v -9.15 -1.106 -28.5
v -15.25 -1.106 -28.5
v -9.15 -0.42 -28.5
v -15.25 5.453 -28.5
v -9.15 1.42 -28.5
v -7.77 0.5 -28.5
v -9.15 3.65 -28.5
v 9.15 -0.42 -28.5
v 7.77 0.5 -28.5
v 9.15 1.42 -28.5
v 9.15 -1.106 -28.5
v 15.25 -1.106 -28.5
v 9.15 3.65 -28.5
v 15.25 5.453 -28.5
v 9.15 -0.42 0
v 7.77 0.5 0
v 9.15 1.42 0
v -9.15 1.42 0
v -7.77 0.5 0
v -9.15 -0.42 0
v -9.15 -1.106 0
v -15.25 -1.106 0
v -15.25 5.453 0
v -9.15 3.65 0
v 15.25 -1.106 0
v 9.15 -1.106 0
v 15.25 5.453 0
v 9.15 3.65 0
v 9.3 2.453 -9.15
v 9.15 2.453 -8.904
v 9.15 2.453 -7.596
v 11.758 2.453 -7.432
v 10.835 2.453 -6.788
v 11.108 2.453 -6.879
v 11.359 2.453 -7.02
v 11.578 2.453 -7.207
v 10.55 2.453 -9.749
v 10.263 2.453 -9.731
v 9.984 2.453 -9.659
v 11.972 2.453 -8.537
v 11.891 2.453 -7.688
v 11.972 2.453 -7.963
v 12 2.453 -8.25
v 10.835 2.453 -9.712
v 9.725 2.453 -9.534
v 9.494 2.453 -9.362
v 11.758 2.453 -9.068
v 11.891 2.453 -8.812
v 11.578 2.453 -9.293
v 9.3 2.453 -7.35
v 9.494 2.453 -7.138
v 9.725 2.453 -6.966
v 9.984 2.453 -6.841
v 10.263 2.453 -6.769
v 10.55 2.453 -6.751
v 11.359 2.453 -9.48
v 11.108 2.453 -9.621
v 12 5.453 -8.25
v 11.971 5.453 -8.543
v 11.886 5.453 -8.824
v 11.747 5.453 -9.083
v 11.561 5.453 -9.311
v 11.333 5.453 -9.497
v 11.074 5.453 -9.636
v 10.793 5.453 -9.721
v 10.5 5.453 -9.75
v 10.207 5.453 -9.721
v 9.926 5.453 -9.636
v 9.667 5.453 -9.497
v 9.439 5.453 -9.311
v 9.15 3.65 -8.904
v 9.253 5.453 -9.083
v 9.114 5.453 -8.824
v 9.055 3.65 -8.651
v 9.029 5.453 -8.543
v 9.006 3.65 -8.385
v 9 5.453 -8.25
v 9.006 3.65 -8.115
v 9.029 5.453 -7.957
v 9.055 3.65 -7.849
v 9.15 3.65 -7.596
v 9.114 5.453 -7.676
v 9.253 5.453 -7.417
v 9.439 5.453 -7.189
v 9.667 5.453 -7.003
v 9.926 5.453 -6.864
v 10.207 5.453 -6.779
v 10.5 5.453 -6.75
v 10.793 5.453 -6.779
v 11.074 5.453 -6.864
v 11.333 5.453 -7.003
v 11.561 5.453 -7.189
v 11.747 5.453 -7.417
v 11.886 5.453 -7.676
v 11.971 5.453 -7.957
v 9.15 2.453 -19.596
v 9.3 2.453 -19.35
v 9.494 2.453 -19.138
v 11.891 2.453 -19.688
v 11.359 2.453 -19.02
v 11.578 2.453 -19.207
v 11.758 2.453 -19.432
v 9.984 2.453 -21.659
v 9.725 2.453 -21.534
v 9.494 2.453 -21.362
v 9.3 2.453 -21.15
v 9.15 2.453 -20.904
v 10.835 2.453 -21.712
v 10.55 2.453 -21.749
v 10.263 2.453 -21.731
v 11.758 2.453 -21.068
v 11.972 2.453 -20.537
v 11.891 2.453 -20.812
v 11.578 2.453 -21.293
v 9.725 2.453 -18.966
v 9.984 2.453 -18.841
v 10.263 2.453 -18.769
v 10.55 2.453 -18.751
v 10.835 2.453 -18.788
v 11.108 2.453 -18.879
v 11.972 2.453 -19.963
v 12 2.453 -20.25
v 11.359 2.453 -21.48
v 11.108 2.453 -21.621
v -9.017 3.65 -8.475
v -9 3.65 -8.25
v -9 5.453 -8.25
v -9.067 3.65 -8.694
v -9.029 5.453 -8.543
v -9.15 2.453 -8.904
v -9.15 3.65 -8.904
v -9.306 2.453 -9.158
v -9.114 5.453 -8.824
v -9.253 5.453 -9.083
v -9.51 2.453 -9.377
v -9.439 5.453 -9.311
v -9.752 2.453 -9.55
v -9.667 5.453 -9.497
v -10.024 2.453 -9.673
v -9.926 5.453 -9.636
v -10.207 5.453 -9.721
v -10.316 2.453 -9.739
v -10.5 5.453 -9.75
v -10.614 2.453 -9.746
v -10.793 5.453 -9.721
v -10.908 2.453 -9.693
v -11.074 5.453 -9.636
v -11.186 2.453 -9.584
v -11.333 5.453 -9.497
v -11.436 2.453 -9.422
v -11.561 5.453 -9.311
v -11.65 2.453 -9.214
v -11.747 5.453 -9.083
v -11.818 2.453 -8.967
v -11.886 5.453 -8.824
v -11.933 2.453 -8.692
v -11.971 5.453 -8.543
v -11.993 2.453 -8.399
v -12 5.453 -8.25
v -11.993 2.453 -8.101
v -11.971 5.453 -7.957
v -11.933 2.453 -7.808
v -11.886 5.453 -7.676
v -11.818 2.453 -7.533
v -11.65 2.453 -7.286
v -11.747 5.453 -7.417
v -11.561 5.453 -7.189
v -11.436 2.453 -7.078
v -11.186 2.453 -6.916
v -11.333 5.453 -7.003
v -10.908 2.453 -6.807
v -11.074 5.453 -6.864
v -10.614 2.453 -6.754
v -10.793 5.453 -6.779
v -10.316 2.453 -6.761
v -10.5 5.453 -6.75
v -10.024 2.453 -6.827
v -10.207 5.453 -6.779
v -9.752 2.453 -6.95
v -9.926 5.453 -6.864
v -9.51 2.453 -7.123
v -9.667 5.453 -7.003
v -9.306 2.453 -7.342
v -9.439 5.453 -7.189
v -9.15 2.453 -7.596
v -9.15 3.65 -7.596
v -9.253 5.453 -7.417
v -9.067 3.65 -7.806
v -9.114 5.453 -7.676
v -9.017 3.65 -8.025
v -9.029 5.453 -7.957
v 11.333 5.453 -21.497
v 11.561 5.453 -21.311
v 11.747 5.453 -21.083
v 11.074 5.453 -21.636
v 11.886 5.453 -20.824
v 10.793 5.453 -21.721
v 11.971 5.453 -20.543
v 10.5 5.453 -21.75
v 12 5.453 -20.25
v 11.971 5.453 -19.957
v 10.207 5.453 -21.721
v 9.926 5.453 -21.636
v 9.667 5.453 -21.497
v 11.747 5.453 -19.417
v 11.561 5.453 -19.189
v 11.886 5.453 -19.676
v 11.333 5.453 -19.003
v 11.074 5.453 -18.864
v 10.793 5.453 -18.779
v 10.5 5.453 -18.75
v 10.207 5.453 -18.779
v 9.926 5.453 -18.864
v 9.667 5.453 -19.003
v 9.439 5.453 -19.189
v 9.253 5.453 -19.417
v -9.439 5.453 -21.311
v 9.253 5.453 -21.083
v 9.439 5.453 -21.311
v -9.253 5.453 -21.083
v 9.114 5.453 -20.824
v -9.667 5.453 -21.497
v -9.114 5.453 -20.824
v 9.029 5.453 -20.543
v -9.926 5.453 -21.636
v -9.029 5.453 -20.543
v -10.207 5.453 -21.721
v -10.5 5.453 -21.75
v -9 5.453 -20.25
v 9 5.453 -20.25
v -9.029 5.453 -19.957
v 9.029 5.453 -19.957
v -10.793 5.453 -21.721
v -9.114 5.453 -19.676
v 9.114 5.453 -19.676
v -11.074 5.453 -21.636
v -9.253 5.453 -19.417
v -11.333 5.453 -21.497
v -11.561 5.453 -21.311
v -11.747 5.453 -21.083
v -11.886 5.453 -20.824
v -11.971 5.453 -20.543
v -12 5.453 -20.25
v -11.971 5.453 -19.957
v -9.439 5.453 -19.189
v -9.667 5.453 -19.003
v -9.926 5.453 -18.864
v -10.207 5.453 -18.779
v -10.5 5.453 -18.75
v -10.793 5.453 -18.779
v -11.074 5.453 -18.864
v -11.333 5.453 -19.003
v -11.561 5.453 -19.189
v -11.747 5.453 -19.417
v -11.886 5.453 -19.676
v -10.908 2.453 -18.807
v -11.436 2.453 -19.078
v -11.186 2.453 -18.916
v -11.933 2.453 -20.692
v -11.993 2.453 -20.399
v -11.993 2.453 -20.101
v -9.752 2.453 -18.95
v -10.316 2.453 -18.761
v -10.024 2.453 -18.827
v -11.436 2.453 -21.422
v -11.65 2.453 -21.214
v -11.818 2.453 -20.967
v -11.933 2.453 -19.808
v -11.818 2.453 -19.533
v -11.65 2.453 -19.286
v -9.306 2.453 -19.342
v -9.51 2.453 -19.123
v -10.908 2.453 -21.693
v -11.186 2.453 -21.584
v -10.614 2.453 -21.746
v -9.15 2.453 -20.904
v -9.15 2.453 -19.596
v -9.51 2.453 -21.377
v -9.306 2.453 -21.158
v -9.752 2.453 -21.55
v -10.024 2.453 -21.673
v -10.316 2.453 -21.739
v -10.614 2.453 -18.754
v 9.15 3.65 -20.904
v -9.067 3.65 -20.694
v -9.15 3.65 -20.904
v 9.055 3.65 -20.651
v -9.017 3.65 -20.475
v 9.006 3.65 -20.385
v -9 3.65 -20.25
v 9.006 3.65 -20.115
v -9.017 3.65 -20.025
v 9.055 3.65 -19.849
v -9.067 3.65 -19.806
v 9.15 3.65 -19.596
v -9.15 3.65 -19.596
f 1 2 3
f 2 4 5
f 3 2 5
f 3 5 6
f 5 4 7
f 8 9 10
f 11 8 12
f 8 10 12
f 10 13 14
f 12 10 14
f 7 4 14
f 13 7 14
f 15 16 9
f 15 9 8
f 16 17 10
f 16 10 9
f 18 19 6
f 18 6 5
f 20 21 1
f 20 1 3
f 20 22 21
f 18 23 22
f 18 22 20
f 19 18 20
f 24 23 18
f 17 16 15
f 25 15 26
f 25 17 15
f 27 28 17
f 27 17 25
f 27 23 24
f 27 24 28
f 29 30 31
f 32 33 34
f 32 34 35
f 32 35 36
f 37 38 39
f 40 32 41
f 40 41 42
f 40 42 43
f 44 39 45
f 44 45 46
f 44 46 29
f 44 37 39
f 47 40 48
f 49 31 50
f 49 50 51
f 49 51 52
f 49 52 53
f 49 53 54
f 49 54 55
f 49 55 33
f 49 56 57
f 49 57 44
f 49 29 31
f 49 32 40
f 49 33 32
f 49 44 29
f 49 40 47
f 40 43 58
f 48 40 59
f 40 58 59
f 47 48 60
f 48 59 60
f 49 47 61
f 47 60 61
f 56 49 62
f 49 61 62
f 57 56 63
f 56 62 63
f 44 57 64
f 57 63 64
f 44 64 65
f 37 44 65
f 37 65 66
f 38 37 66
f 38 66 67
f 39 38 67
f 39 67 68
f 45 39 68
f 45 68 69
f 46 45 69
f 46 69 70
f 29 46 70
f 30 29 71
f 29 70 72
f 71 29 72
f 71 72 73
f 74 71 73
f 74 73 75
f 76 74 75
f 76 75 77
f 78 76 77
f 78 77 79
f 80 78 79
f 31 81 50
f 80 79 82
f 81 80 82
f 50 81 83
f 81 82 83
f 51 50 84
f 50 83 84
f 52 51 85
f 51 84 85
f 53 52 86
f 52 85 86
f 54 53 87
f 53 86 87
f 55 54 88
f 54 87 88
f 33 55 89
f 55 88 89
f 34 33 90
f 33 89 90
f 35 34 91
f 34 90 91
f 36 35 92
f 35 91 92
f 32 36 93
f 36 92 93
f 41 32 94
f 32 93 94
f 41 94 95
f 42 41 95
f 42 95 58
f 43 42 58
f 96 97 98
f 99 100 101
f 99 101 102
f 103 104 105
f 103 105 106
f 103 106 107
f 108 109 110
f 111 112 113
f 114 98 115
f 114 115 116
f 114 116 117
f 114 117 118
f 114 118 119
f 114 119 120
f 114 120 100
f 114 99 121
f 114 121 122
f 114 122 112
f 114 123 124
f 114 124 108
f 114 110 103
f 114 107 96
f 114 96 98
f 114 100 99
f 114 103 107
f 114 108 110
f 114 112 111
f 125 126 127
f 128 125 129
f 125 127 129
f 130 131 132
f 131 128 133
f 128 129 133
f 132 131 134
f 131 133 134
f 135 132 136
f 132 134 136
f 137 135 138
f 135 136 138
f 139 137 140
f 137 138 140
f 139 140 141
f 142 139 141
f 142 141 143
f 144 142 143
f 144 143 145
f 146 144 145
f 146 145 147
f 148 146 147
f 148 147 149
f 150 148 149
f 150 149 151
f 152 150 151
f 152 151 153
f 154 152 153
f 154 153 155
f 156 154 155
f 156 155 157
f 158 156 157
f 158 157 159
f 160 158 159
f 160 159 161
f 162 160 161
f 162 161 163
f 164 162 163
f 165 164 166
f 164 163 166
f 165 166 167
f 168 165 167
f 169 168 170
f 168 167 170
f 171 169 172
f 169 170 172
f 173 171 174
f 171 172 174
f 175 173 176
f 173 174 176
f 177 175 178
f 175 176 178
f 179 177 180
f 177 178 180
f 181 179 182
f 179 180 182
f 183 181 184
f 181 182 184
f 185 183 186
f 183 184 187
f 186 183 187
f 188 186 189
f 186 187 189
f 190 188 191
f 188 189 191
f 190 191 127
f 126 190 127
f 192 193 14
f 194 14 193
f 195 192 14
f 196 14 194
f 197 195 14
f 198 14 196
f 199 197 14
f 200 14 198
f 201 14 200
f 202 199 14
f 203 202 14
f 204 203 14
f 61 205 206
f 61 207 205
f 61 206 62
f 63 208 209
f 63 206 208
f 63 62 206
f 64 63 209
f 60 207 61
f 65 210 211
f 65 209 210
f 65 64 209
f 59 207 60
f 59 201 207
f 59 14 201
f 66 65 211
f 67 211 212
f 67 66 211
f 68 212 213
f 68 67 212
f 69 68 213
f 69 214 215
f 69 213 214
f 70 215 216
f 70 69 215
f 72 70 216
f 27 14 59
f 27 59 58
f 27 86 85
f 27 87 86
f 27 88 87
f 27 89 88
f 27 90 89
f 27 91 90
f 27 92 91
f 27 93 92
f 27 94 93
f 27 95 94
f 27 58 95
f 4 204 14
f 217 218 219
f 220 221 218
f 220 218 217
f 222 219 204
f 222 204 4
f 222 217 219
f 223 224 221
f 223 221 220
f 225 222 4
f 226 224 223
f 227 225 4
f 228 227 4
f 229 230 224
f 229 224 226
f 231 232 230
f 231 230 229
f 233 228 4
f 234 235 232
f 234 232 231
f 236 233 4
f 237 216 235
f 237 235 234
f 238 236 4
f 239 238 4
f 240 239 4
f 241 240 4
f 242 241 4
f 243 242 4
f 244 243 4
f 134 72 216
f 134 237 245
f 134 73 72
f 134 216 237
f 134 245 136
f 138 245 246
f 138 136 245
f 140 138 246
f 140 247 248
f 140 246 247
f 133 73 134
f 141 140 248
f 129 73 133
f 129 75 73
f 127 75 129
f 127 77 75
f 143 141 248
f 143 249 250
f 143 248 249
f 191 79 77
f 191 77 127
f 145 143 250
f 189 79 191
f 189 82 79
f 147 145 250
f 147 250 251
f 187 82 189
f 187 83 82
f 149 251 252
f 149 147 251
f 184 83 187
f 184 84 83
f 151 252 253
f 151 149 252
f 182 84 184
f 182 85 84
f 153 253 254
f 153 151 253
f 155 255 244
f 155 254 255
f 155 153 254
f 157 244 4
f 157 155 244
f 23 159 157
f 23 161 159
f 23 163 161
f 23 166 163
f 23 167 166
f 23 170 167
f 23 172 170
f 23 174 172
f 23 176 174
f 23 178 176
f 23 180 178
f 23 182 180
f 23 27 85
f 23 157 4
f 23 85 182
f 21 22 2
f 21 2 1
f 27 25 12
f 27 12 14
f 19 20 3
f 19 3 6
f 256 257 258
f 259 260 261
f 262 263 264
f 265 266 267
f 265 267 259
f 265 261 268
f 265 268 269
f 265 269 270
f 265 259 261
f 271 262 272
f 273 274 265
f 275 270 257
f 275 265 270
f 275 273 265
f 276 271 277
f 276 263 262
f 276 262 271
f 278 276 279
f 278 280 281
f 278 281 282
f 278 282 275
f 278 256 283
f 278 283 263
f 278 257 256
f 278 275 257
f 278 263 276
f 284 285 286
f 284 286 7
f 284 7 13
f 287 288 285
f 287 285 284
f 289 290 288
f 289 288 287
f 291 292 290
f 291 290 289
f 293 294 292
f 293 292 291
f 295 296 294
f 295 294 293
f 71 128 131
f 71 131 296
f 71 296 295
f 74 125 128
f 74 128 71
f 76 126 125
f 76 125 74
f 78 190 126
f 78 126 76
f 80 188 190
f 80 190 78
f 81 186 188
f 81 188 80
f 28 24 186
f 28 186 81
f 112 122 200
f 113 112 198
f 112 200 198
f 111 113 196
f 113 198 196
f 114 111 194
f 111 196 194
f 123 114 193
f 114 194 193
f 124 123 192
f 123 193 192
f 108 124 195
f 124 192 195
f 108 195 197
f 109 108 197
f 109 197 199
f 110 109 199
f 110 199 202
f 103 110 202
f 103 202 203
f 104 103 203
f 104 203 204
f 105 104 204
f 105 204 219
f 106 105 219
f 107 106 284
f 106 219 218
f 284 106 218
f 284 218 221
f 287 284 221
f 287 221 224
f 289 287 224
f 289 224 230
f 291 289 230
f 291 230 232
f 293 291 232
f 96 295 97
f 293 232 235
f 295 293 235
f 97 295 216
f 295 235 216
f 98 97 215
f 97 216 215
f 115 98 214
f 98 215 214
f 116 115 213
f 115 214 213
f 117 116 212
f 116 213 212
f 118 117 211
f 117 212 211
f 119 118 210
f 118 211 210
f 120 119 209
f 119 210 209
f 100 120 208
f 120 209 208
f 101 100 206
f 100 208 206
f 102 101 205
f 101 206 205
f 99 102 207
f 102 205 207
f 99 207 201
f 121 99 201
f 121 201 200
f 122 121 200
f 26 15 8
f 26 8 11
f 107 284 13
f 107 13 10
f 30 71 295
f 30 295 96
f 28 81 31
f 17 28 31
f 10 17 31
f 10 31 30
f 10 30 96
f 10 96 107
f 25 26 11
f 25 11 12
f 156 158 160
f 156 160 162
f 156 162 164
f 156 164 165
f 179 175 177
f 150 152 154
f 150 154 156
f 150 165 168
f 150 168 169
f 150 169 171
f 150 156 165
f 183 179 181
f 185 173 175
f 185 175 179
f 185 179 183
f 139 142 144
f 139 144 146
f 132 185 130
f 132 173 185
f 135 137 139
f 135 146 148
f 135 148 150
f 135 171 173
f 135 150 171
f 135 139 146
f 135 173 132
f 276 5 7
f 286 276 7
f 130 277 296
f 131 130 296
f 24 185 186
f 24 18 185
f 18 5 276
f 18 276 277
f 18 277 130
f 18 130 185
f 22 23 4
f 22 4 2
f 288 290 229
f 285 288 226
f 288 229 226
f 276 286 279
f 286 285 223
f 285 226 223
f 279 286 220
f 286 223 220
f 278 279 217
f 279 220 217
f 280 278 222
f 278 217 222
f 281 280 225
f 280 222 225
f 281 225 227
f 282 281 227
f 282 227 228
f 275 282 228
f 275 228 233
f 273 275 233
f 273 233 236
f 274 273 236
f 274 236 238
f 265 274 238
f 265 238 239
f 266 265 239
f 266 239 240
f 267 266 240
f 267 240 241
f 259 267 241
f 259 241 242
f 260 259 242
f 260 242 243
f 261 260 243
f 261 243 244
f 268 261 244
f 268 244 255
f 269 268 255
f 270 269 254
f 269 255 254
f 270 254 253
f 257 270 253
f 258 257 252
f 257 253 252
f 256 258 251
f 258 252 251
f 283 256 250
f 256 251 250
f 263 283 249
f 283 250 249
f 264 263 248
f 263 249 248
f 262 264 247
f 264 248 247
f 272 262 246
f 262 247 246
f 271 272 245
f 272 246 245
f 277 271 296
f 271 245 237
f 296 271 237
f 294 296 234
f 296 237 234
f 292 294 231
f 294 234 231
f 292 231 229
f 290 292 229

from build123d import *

# Parameters (mm, degrees)
BOSS_EXTRUDE1_DEPTH = 28.5
SKETCH2_R           = 1.5
CUT_EXTRUDE1_DEPTH  = 3


with BuildPart() as part:
    # Sketch1 → Boss-Extrude1 (new body)
    with BuildSketch(Plane.XY):
        Polygon((-9.15, -1.105576246), (-9.15, -0.419722436), (-7.770416346, 0.5), (-9.15, 1.419722436), (-9.15, 3.65), (9.15, 3.65), (9.15, 1.419722436), (7.770416346, 0.5), (9.15, -0.419722436), (9.15, -1.105576246), (15.25, -1.105576246), (15.25, 5.45289456), (-15.25, 5.45289456), (-15.25, -1.105576246), align=None)
    extrude(amount=-BOSS_EXTRUDE1_DEPTH)

    # Sketch2 → Cut-Extrude1 (cut)
    with BuildSketch(Plane(origin=(0, 5.45289456, 0), x_dir=(1, 0, 0), z_dir=(0, 1, 0))):
        with Locations((-10.5, 8.25)):
            Circle(SKETCH2_R)
        with Locations((-10.5, 20.25)):
            Circle(SKETCH2_R)
        with Locations((10.5, 20.25)):
            Circle(SKETCH2_R)
        with Locations((10.5, 8.25)):
            Circle(SKETCH2_R)
    extrude(amount=-CUT_EXTRUDE1_DEPTH, mode=Mode.SUBTRACT)


solid = part.part
